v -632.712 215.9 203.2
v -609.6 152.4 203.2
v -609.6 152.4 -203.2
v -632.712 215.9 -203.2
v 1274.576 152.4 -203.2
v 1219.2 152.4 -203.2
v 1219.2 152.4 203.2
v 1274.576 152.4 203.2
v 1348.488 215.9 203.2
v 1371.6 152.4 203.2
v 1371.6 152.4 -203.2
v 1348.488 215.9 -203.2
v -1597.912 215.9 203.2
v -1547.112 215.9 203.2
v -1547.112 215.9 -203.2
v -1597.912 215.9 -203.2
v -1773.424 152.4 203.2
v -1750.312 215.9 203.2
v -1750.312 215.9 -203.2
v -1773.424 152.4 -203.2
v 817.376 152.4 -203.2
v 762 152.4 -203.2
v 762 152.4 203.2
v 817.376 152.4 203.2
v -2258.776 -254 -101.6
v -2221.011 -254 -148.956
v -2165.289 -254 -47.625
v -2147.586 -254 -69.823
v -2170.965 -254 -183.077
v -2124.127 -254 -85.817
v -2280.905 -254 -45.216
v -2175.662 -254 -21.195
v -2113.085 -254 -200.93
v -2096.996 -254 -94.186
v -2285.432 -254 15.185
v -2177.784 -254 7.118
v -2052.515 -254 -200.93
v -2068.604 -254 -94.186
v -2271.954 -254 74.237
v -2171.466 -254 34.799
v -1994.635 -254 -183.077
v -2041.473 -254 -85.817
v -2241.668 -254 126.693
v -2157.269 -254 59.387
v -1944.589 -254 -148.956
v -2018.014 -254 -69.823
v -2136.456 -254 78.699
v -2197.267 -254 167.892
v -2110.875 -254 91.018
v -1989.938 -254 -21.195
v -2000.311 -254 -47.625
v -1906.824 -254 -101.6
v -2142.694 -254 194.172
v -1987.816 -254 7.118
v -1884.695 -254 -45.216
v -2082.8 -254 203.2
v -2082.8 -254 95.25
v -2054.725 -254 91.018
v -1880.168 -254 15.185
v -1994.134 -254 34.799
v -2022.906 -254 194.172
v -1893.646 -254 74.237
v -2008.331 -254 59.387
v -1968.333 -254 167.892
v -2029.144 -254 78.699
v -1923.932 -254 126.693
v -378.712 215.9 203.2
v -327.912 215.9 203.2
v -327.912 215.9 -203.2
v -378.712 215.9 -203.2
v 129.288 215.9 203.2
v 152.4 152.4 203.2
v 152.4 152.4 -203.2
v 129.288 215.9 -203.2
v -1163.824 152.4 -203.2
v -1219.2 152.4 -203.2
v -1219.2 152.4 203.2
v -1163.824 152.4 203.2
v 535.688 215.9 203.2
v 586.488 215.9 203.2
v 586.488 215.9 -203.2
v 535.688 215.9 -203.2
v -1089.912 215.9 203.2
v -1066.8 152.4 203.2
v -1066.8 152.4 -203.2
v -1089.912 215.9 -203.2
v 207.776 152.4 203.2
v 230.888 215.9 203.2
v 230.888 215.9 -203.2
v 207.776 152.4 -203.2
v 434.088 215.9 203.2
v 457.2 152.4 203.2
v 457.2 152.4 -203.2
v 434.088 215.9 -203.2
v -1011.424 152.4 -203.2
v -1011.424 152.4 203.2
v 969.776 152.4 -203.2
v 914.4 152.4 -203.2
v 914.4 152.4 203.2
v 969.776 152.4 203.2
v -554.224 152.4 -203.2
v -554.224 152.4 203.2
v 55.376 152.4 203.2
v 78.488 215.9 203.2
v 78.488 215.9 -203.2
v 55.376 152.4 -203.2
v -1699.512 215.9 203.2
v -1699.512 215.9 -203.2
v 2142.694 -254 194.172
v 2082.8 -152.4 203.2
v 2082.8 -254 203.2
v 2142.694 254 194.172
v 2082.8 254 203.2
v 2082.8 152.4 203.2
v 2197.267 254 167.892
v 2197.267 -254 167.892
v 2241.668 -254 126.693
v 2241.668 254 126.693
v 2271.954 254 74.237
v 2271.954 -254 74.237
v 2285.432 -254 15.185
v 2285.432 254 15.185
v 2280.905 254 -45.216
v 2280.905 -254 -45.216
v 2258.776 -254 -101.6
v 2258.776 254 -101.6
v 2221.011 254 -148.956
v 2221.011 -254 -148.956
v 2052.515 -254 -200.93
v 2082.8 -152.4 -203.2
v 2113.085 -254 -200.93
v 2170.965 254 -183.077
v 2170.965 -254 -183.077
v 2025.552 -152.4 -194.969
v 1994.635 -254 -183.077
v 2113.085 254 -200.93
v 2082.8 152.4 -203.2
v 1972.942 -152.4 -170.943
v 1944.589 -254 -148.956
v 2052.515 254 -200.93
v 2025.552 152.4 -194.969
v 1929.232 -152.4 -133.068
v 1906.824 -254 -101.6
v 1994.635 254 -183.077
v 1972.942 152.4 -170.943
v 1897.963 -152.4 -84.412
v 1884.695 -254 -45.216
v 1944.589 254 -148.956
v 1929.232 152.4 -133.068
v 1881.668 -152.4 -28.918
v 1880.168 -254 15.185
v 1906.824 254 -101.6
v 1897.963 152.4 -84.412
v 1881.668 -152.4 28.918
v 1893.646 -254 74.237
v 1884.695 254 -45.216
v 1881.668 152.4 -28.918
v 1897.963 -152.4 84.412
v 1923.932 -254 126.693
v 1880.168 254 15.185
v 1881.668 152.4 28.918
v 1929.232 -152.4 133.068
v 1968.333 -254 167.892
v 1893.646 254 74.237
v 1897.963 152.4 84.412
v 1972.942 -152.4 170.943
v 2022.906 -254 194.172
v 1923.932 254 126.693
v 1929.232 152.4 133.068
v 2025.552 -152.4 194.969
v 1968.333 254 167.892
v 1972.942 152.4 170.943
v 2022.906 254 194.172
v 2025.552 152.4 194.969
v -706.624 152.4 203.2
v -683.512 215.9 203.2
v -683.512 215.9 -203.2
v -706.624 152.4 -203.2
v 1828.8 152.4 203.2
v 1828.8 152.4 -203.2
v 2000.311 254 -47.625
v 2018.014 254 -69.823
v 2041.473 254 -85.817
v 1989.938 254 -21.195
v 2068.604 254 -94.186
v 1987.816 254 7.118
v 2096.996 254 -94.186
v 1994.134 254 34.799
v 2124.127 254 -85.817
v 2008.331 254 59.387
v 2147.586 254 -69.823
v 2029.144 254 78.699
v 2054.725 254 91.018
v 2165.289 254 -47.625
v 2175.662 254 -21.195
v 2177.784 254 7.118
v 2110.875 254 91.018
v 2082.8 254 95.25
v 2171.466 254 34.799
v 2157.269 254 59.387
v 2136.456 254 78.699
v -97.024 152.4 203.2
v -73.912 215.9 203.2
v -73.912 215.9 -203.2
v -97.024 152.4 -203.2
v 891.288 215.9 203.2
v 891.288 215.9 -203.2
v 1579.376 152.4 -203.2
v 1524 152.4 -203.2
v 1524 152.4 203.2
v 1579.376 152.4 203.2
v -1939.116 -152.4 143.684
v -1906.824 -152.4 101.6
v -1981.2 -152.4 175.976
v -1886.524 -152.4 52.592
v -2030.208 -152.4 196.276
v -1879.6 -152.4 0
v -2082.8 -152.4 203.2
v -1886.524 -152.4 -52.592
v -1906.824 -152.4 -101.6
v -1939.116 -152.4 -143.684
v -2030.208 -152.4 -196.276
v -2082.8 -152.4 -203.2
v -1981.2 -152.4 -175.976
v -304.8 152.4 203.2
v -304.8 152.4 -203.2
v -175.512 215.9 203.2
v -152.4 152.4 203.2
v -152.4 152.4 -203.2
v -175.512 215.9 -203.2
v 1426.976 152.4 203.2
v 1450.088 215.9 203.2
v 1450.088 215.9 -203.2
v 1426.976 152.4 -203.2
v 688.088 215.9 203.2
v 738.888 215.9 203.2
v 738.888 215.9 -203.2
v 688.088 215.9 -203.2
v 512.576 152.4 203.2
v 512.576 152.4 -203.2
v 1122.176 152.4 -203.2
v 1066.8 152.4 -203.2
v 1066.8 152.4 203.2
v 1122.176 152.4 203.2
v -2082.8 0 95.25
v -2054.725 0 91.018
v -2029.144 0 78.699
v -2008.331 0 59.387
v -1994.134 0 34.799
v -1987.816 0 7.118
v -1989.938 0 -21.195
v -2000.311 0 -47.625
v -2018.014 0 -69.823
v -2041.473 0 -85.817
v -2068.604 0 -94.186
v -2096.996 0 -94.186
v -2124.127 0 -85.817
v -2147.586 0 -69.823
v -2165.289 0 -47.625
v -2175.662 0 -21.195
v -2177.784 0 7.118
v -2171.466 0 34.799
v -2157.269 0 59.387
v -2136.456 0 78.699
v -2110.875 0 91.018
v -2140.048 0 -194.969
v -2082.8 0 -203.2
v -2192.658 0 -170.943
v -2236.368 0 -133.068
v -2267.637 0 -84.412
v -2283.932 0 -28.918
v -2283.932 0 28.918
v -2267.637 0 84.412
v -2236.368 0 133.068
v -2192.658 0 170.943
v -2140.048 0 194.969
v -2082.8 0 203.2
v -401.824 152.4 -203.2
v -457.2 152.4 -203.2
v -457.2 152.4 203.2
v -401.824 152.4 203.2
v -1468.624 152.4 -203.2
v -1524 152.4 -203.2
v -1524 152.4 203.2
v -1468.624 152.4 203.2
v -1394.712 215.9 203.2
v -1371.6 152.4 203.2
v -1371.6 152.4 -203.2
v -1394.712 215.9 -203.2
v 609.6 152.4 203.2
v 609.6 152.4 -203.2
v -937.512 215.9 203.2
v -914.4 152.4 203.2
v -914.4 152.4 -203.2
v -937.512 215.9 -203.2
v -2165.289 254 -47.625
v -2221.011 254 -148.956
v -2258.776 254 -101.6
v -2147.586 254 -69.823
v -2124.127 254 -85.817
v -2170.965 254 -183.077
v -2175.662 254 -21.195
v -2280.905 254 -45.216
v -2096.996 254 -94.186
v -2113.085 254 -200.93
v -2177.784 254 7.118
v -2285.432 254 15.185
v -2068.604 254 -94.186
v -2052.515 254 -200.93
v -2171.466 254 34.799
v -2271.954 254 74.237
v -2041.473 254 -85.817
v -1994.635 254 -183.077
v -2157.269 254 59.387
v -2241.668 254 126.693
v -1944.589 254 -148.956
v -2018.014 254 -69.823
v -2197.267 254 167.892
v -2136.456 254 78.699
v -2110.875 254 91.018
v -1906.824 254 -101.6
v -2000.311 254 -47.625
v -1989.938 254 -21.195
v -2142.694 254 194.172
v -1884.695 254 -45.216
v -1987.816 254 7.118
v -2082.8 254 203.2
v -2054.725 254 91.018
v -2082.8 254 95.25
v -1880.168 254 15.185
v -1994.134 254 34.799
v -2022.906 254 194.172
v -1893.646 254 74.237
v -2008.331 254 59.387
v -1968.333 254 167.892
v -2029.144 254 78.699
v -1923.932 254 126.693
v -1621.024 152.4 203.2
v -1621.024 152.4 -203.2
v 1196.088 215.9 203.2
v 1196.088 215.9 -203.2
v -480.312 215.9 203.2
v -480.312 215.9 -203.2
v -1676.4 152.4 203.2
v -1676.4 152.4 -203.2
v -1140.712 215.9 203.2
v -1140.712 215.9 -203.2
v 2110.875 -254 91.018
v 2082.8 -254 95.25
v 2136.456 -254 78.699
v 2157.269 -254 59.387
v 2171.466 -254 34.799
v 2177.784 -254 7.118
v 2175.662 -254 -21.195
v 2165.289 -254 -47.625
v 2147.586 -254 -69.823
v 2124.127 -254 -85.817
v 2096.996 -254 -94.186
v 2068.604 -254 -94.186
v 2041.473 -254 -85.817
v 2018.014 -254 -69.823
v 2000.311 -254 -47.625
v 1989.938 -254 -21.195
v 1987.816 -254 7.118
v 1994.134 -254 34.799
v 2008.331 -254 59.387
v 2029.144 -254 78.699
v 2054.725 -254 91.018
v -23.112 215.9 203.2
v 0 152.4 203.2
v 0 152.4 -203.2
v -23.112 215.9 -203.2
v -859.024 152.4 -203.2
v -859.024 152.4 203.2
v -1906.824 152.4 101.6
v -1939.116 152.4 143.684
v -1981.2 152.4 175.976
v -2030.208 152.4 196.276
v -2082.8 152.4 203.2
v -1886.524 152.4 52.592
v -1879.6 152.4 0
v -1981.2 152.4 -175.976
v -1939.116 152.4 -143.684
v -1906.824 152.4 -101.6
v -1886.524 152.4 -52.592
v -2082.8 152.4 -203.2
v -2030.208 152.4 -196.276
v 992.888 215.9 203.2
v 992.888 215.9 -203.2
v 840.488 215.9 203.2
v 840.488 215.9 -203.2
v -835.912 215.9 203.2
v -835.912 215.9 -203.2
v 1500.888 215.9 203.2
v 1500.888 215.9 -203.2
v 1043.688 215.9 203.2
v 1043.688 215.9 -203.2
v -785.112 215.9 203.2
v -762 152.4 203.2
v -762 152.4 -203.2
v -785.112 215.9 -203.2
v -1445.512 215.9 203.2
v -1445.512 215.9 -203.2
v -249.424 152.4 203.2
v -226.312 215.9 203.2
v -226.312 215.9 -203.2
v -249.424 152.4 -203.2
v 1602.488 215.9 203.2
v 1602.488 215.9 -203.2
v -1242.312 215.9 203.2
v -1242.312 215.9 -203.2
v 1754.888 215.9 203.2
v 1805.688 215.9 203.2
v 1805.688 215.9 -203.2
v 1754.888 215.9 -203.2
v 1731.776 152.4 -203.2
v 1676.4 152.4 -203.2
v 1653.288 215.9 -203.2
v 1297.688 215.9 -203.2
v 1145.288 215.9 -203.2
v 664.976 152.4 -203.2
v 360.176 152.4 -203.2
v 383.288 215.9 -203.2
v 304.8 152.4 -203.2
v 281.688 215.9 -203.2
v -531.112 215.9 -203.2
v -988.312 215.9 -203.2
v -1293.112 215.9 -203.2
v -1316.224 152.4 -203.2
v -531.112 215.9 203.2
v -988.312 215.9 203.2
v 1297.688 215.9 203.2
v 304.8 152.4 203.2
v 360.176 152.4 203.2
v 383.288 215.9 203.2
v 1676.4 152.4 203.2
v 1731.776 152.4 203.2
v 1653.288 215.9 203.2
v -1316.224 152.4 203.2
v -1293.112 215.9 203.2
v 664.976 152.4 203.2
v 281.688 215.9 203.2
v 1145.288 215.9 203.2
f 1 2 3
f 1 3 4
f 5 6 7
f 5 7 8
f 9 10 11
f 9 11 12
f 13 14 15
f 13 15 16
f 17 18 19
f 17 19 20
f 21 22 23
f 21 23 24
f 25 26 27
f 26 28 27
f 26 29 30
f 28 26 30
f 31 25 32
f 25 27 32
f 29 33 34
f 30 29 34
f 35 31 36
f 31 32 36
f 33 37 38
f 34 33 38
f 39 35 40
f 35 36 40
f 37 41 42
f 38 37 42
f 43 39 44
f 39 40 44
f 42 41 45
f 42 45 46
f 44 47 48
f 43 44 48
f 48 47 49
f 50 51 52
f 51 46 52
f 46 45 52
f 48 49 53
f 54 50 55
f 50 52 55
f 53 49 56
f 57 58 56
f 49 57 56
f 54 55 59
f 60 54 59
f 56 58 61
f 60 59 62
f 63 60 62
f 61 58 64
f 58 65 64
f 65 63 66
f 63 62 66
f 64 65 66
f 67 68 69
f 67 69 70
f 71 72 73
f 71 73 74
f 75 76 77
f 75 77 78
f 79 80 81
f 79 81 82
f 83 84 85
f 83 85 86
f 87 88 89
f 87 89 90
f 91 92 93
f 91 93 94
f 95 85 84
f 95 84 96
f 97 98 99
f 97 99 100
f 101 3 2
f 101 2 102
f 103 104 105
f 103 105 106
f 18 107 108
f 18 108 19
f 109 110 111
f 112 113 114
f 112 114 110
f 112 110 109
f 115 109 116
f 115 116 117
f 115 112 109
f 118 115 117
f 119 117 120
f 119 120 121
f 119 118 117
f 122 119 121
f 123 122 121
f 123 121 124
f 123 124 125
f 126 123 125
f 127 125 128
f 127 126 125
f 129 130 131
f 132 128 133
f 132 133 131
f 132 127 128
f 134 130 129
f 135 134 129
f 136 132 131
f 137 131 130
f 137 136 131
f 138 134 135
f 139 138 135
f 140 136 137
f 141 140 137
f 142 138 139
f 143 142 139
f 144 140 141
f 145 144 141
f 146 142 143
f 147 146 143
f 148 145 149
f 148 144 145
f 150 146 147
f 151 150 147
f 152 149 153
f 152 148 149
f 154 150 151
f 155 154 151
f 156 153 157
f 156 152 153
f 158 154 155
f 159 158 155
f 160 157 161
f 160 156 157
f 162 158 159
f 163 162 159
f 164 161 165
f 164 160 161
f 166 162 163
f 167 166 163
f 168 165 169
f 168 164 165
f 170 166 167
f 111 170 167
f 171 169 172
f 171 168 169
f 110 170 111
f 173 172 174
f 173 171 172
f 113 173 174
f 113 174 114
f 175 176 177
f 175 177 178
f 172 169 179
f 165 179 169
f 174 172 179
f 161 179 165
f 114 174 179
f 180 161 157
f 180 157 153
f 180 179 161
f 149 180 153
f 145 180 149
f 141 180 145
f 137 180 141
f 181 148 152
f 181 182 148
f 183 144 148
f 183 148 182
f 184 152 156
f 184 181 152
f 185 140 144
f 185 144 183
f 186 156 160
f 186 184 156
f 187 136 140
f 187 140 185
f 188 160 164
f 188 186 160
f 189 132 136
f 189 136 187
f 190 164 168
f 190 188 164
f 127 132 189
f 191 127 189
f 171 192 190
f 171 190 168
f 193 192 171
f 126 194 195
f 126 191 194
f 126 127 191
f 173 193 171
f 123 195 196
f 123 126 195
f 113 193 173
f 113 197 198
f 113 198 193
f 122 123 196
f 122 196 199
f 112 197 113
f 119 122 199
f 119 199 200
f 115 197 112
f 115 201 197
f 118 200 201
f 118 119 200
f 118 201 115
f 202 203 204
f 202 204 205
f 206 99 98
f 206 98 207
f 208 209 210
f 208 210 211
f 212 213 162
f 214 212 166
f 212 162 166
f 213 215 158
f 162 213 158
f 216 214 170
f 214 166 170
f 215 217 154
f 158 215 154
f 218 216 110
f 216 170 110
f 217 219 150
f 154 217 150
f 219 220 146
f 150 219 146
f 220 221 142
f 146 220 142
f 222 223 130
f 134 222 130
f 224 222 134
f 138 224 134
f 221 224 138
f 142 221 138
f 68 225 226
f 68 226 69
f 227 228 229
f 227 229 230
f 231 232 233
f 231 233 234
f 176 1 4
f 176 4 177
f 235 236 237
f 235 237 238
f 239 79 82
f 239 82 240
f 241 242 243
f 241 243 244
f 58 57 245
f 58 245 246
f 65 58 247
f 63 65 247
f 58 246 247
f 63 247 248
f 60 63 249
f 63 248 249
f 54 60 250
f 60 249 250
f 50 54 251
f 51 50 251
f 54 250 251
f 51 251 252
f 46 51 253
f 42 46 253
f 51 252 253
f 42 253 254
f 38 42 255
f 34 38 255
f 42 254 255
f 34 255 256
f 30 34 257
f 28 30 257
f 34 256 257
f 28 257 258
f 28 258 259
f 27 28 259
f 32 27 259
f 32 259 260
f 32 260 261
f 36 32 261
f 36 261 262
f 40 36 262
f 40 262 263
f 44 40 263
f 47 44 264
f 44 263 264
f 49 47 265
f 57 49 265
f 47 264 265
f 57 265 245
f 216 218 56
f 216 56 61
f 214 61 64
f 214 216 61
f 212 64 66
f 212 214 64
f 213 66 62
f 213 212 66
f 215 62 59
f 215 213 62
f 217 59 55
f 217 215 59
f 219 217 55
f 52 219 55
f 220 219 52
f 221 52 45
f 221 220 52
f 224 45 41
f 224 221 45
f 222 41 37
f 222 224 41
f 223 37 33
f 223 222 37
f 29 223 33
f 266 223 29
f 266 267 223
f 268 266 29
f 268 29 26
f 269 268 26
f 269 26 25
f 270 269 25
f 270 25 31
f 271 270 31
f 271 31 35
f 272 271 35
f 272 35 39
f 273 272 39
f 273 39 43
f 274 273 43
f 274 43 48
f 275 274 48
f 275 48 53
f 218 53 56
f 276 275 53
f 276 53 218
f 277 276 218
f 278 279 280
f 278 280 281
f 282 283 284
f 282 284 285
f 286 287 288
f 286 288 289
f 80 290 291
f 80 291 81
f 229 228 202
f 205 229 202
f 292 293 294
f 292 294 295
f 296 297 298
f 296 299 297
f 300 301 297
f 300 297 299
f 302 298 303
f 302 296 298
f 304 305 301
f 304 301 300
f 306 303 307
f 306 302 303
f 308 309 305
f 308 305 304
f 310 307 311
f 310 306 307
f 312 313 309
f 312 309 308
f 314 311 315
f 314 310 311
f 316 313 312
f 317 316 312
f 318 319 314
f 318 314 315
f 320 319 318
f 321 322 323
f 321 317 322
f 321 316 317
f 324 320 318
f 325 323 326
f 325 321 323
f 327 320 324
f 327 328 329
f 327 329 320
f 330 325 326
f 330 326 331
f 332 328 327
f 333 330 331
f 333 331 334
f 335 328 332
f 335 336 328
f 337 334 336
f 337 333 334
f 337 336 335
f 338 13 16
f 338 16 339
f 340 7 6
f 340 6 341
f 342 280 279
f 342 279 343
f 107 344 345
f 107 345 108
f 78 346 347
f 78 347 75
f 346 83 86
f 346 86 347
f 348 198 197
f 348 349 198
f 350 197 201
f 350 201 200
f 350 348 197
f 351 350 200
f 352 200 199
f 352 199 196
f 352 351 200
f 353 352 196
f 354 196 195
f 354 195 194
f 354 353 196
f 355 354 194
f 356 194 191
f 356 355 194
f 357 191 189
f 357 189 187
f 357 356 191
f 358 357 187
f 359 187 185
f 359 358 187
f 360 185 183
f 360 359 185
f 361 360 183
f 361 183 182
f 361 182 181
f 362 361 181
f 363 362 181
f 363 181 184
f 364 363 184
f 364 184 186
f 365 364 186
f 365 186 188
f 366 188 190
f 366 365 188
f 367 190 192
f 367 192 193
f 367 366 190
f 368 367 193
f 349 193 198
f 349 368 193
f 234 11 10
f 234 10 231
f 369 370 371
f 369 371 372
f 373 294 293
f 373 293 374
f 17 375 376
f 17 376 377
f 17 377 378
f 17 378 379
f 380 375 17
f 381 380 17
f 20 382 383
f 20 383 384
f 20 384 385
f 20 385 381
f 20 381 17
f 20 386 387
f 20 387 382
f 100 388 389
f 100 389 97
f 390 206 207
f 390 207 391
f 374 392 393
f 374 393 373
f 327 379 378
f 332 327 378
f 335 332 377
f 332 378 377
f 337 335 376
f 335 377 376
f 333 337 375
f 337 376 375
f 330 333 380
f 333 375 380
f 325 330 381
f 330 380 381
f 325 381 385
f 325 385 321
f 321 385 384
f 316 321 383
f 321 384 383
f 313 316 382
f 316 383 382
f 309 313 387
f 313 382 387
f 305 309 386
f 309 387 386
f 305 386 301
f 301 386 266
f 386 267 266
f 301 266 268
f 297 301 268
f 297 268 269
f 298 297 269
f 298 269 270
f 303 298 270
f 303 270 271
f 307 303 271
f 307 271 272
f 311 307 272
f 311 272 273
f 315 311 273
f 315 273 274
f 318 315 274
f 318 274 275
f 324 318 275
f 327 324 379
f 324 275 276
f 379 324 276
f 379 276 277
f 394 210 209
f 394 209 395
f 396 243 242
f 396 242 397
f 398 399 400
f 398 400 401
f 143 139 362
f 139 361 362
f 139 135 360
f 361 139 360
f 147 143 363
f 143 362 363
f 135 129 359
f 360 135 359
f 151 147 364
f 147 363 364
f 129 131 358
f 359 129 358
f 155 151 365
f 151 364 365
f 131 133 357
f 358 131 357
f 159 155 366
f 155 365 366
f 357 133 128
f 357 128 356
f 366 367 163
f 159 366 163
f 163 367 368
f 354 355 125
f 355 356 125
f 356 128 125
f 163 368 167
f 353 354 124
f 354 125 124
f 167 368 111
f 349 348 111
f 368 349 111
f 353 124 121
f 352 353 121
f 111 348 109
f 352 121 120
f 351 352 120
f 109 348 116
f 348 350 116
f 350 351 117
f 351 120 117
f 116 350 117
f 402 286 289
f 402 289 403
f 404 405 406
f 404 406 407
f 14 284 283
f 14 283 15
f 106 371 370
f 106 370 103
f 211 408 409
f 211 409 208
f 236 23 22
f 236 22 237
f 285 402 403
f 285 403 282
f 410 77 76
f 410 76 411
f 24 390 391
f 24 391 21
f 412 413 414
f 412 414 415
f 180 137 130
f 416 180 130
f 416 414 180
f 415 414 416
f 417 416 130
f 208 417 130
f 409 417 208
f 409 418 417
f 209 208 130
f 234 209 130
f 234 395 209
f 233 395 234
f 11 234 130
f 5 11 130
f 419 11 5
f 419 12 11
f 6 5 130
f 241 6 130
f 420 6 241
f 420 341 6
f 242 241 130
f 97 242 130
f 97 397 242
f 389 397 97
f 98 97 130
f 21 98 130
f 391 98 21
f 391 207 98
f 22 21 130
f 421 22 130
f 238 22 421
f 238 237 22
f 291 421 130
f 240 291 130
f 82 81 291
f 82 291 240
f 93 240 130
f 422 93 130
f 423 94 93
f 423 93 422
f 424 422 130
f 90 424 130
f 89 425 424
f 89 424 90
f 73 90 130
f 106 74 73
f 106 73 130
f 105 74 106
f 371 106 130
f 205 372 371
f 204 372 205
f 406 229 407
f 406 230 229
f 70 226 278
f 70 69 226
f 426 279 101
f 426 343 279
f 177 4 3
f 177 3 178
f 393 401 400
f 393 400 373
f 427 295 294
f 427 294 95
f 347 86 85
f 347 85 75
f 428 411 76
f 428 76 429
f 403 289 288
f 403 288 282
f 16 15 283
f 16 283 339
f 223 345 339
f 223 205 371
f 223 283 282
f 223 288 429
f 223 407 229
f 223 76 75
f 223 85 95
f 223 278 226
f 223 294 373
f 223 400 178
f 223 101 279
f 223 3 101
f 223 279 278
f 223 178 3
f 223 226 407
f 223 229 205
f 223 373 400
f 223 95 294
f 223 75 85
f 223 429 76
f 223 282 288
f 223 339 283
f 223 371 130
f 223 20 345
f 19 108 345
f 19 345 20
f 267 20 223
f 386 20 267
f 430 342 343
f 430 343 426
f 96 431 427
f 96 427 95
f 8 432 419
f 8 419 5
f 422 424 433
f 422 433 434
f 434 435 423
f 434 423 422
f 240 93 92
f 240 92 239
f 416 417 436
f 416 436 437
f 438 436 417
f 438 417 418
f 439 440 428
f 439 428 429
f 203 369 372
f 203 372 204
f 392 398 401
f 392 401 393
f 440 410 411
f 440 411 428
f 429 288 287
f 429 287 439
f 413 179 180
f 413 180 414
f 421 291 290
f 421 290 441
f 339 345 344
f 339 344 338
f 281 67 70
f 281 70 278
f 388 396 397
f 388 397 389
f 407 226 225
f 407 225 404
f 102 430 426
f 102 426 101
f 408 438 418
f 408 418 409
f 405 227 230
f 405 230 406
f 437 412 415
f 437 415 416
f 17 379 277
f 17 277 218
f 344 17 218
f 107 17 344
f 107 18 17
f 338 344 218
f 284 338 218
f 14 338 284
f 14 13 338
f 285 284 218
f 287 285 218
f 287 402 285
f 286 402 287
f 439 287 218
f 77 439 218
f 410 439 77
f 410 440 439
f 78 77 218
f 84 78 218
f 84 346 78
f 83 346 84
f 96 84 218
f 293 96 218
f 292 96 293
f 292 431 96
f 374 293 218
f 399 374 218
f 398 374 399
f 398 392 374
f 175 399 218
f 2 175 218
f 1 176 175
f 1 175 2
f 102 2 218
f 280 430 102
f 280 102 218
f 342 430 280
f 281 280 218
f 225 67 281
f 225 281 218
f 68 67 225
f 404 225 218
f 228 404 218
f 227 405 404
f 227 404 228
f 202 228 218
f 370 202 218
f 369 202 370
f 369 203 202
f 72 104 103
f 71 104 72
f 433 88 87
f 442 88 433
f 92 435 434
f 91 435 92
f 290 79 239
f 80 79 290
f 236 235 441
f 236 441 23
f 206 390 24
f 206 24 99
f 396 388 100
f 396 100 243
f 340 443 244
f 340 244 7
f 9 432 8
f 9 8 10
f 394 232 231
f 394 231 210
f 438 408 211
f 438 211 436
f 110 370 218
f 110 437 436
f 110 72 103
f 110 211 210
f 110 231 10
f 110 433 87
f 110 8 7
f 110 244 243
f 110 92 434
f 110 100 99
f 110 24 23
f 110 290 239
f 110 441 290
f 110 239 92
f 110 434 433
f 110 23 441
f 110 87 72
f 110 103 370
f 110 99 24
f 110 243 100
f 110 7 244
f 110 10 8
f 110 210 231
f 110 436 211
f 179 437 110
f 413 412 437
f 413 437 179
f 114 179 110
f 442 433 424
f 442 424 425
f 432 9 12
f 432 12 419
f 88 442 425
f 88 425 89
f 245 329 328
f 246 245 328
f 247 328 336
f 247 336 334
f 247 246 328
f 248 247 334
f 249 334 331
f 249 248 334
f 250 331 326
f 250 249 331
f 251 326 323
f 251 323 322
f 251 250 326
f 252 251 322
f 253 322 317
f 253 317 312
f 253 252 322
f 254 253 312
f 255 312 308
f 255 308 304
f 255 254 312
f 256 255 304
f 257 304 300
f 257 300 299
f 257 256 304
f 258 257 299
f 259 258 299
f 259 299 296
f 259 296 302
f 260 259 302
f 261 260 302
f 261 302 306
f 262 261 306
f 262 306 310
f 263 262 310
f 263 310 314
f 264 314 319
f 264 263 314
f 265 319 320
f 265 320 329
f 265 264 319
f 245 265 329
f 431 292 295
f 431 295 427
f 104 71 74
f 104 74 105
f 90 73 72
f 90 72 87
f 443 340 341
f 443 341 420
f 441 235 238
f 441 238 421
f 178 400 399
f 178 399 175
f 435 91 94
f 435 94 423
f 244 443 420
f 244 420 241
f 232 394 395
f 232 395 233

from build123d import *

# Parameters (mm, degrees)
BOSS_EXTRUDE1_DEPTH = 152.4
SKETCH1_4_R         = 203.2
SKETCH1_4_R_2       = 95.25
BOSS_EXTRUDE2_DEPTH = 254
BOSS_EXTRUDE3_DEPTH = 406.4
LPATTERN1_COUNT     = 24
LPATTERN1_PITCH     = 152.4


with BuildPart() as part:
    # Sketch1 → Boss-Extrude1 (new, symmetric)
    with BuildSketch(Plane(origin=(0, 0, 0), x_dir=(1, 0, 0), z_dir=(0, 1, 0))):
        with BuildLine():
            ThreePointArc((-1879.6, 0), (-1939.115902063, -143.684097937), (-2082.8, -203.2))
            Line((-2082.8, -203.2), (2082.8, -203.2))
            ThreePointArc((2082.8, -203.2), (1879.6, 0), (2082.8, 203.2))
            Line((2082.8, 203.2), (-2082.8, 203.2))
            ThreePointArc((-2082.8, 203.2), (-1939.115902063, 143.684097937), (-1879.6, 0))
        make_face()
    extrude(amount=BOSS_EXTRUDE1_DEPTH, both=True)

    # Sketch1<4> → Boss-Extrude2 (add, symmetric)
    # profile 1 of 2: a face of its own
    with BuildSketch(Plane(origin=(0, 0, 0), x_dir=(1, 0, 0), z_dir=(0, 1, 0))):
        with Locations(Location((-2082.8, 0, 0), (0, 0, 270))):
            Circle(SKETCH1_4_R)
        with Locations(Location((-2082.8, 0, 0), (0, 0, 270))):
            Circle(SKETCH1_4_R_2, mode=Mode.SUBTRACT)
    # profile 2 of 2: a face of its own
    with BuildSketch(Plane(origin=(0, 0, 0), x_dir=(1, 0, 0), z_dir=(0, 1, 0))):
        with Locations(Location((2082.8, 0, 0), (0, 0, 270))):
            Circle(SKETCH1_4_R)
        with Locations(Location((2082.8, 0, 0), (0, 0, 270))):
            Circle(SKETCH1_4_R_2, mode=Mode.SUBTRACT)
    extrude(amount=BOSS_EXTRUDE2_DEPTH, both=True)

    # Sketch2 → Boss-Extrude3 (add)
    with BuildSketch(Plane.XY.offset(203.2)):
        Polygon((1828.8, 152.4), (1805.687890124, 215.9), (1754.887890124, 215.9), (1731.775780248, 152.4), align=None)
    boss_extrude3 = extrude(amount=-BOSS_EXTRUDE3_DEPTH)

    # LPattern1: Boss-Extrude3 ×24
    with Locations(*[(-i * LPATTERN1_PITCH, 0, 0) for i in range(1, LPATTERN1_COUNT)]):
        add(boss_extrude3)


solid = part.part
